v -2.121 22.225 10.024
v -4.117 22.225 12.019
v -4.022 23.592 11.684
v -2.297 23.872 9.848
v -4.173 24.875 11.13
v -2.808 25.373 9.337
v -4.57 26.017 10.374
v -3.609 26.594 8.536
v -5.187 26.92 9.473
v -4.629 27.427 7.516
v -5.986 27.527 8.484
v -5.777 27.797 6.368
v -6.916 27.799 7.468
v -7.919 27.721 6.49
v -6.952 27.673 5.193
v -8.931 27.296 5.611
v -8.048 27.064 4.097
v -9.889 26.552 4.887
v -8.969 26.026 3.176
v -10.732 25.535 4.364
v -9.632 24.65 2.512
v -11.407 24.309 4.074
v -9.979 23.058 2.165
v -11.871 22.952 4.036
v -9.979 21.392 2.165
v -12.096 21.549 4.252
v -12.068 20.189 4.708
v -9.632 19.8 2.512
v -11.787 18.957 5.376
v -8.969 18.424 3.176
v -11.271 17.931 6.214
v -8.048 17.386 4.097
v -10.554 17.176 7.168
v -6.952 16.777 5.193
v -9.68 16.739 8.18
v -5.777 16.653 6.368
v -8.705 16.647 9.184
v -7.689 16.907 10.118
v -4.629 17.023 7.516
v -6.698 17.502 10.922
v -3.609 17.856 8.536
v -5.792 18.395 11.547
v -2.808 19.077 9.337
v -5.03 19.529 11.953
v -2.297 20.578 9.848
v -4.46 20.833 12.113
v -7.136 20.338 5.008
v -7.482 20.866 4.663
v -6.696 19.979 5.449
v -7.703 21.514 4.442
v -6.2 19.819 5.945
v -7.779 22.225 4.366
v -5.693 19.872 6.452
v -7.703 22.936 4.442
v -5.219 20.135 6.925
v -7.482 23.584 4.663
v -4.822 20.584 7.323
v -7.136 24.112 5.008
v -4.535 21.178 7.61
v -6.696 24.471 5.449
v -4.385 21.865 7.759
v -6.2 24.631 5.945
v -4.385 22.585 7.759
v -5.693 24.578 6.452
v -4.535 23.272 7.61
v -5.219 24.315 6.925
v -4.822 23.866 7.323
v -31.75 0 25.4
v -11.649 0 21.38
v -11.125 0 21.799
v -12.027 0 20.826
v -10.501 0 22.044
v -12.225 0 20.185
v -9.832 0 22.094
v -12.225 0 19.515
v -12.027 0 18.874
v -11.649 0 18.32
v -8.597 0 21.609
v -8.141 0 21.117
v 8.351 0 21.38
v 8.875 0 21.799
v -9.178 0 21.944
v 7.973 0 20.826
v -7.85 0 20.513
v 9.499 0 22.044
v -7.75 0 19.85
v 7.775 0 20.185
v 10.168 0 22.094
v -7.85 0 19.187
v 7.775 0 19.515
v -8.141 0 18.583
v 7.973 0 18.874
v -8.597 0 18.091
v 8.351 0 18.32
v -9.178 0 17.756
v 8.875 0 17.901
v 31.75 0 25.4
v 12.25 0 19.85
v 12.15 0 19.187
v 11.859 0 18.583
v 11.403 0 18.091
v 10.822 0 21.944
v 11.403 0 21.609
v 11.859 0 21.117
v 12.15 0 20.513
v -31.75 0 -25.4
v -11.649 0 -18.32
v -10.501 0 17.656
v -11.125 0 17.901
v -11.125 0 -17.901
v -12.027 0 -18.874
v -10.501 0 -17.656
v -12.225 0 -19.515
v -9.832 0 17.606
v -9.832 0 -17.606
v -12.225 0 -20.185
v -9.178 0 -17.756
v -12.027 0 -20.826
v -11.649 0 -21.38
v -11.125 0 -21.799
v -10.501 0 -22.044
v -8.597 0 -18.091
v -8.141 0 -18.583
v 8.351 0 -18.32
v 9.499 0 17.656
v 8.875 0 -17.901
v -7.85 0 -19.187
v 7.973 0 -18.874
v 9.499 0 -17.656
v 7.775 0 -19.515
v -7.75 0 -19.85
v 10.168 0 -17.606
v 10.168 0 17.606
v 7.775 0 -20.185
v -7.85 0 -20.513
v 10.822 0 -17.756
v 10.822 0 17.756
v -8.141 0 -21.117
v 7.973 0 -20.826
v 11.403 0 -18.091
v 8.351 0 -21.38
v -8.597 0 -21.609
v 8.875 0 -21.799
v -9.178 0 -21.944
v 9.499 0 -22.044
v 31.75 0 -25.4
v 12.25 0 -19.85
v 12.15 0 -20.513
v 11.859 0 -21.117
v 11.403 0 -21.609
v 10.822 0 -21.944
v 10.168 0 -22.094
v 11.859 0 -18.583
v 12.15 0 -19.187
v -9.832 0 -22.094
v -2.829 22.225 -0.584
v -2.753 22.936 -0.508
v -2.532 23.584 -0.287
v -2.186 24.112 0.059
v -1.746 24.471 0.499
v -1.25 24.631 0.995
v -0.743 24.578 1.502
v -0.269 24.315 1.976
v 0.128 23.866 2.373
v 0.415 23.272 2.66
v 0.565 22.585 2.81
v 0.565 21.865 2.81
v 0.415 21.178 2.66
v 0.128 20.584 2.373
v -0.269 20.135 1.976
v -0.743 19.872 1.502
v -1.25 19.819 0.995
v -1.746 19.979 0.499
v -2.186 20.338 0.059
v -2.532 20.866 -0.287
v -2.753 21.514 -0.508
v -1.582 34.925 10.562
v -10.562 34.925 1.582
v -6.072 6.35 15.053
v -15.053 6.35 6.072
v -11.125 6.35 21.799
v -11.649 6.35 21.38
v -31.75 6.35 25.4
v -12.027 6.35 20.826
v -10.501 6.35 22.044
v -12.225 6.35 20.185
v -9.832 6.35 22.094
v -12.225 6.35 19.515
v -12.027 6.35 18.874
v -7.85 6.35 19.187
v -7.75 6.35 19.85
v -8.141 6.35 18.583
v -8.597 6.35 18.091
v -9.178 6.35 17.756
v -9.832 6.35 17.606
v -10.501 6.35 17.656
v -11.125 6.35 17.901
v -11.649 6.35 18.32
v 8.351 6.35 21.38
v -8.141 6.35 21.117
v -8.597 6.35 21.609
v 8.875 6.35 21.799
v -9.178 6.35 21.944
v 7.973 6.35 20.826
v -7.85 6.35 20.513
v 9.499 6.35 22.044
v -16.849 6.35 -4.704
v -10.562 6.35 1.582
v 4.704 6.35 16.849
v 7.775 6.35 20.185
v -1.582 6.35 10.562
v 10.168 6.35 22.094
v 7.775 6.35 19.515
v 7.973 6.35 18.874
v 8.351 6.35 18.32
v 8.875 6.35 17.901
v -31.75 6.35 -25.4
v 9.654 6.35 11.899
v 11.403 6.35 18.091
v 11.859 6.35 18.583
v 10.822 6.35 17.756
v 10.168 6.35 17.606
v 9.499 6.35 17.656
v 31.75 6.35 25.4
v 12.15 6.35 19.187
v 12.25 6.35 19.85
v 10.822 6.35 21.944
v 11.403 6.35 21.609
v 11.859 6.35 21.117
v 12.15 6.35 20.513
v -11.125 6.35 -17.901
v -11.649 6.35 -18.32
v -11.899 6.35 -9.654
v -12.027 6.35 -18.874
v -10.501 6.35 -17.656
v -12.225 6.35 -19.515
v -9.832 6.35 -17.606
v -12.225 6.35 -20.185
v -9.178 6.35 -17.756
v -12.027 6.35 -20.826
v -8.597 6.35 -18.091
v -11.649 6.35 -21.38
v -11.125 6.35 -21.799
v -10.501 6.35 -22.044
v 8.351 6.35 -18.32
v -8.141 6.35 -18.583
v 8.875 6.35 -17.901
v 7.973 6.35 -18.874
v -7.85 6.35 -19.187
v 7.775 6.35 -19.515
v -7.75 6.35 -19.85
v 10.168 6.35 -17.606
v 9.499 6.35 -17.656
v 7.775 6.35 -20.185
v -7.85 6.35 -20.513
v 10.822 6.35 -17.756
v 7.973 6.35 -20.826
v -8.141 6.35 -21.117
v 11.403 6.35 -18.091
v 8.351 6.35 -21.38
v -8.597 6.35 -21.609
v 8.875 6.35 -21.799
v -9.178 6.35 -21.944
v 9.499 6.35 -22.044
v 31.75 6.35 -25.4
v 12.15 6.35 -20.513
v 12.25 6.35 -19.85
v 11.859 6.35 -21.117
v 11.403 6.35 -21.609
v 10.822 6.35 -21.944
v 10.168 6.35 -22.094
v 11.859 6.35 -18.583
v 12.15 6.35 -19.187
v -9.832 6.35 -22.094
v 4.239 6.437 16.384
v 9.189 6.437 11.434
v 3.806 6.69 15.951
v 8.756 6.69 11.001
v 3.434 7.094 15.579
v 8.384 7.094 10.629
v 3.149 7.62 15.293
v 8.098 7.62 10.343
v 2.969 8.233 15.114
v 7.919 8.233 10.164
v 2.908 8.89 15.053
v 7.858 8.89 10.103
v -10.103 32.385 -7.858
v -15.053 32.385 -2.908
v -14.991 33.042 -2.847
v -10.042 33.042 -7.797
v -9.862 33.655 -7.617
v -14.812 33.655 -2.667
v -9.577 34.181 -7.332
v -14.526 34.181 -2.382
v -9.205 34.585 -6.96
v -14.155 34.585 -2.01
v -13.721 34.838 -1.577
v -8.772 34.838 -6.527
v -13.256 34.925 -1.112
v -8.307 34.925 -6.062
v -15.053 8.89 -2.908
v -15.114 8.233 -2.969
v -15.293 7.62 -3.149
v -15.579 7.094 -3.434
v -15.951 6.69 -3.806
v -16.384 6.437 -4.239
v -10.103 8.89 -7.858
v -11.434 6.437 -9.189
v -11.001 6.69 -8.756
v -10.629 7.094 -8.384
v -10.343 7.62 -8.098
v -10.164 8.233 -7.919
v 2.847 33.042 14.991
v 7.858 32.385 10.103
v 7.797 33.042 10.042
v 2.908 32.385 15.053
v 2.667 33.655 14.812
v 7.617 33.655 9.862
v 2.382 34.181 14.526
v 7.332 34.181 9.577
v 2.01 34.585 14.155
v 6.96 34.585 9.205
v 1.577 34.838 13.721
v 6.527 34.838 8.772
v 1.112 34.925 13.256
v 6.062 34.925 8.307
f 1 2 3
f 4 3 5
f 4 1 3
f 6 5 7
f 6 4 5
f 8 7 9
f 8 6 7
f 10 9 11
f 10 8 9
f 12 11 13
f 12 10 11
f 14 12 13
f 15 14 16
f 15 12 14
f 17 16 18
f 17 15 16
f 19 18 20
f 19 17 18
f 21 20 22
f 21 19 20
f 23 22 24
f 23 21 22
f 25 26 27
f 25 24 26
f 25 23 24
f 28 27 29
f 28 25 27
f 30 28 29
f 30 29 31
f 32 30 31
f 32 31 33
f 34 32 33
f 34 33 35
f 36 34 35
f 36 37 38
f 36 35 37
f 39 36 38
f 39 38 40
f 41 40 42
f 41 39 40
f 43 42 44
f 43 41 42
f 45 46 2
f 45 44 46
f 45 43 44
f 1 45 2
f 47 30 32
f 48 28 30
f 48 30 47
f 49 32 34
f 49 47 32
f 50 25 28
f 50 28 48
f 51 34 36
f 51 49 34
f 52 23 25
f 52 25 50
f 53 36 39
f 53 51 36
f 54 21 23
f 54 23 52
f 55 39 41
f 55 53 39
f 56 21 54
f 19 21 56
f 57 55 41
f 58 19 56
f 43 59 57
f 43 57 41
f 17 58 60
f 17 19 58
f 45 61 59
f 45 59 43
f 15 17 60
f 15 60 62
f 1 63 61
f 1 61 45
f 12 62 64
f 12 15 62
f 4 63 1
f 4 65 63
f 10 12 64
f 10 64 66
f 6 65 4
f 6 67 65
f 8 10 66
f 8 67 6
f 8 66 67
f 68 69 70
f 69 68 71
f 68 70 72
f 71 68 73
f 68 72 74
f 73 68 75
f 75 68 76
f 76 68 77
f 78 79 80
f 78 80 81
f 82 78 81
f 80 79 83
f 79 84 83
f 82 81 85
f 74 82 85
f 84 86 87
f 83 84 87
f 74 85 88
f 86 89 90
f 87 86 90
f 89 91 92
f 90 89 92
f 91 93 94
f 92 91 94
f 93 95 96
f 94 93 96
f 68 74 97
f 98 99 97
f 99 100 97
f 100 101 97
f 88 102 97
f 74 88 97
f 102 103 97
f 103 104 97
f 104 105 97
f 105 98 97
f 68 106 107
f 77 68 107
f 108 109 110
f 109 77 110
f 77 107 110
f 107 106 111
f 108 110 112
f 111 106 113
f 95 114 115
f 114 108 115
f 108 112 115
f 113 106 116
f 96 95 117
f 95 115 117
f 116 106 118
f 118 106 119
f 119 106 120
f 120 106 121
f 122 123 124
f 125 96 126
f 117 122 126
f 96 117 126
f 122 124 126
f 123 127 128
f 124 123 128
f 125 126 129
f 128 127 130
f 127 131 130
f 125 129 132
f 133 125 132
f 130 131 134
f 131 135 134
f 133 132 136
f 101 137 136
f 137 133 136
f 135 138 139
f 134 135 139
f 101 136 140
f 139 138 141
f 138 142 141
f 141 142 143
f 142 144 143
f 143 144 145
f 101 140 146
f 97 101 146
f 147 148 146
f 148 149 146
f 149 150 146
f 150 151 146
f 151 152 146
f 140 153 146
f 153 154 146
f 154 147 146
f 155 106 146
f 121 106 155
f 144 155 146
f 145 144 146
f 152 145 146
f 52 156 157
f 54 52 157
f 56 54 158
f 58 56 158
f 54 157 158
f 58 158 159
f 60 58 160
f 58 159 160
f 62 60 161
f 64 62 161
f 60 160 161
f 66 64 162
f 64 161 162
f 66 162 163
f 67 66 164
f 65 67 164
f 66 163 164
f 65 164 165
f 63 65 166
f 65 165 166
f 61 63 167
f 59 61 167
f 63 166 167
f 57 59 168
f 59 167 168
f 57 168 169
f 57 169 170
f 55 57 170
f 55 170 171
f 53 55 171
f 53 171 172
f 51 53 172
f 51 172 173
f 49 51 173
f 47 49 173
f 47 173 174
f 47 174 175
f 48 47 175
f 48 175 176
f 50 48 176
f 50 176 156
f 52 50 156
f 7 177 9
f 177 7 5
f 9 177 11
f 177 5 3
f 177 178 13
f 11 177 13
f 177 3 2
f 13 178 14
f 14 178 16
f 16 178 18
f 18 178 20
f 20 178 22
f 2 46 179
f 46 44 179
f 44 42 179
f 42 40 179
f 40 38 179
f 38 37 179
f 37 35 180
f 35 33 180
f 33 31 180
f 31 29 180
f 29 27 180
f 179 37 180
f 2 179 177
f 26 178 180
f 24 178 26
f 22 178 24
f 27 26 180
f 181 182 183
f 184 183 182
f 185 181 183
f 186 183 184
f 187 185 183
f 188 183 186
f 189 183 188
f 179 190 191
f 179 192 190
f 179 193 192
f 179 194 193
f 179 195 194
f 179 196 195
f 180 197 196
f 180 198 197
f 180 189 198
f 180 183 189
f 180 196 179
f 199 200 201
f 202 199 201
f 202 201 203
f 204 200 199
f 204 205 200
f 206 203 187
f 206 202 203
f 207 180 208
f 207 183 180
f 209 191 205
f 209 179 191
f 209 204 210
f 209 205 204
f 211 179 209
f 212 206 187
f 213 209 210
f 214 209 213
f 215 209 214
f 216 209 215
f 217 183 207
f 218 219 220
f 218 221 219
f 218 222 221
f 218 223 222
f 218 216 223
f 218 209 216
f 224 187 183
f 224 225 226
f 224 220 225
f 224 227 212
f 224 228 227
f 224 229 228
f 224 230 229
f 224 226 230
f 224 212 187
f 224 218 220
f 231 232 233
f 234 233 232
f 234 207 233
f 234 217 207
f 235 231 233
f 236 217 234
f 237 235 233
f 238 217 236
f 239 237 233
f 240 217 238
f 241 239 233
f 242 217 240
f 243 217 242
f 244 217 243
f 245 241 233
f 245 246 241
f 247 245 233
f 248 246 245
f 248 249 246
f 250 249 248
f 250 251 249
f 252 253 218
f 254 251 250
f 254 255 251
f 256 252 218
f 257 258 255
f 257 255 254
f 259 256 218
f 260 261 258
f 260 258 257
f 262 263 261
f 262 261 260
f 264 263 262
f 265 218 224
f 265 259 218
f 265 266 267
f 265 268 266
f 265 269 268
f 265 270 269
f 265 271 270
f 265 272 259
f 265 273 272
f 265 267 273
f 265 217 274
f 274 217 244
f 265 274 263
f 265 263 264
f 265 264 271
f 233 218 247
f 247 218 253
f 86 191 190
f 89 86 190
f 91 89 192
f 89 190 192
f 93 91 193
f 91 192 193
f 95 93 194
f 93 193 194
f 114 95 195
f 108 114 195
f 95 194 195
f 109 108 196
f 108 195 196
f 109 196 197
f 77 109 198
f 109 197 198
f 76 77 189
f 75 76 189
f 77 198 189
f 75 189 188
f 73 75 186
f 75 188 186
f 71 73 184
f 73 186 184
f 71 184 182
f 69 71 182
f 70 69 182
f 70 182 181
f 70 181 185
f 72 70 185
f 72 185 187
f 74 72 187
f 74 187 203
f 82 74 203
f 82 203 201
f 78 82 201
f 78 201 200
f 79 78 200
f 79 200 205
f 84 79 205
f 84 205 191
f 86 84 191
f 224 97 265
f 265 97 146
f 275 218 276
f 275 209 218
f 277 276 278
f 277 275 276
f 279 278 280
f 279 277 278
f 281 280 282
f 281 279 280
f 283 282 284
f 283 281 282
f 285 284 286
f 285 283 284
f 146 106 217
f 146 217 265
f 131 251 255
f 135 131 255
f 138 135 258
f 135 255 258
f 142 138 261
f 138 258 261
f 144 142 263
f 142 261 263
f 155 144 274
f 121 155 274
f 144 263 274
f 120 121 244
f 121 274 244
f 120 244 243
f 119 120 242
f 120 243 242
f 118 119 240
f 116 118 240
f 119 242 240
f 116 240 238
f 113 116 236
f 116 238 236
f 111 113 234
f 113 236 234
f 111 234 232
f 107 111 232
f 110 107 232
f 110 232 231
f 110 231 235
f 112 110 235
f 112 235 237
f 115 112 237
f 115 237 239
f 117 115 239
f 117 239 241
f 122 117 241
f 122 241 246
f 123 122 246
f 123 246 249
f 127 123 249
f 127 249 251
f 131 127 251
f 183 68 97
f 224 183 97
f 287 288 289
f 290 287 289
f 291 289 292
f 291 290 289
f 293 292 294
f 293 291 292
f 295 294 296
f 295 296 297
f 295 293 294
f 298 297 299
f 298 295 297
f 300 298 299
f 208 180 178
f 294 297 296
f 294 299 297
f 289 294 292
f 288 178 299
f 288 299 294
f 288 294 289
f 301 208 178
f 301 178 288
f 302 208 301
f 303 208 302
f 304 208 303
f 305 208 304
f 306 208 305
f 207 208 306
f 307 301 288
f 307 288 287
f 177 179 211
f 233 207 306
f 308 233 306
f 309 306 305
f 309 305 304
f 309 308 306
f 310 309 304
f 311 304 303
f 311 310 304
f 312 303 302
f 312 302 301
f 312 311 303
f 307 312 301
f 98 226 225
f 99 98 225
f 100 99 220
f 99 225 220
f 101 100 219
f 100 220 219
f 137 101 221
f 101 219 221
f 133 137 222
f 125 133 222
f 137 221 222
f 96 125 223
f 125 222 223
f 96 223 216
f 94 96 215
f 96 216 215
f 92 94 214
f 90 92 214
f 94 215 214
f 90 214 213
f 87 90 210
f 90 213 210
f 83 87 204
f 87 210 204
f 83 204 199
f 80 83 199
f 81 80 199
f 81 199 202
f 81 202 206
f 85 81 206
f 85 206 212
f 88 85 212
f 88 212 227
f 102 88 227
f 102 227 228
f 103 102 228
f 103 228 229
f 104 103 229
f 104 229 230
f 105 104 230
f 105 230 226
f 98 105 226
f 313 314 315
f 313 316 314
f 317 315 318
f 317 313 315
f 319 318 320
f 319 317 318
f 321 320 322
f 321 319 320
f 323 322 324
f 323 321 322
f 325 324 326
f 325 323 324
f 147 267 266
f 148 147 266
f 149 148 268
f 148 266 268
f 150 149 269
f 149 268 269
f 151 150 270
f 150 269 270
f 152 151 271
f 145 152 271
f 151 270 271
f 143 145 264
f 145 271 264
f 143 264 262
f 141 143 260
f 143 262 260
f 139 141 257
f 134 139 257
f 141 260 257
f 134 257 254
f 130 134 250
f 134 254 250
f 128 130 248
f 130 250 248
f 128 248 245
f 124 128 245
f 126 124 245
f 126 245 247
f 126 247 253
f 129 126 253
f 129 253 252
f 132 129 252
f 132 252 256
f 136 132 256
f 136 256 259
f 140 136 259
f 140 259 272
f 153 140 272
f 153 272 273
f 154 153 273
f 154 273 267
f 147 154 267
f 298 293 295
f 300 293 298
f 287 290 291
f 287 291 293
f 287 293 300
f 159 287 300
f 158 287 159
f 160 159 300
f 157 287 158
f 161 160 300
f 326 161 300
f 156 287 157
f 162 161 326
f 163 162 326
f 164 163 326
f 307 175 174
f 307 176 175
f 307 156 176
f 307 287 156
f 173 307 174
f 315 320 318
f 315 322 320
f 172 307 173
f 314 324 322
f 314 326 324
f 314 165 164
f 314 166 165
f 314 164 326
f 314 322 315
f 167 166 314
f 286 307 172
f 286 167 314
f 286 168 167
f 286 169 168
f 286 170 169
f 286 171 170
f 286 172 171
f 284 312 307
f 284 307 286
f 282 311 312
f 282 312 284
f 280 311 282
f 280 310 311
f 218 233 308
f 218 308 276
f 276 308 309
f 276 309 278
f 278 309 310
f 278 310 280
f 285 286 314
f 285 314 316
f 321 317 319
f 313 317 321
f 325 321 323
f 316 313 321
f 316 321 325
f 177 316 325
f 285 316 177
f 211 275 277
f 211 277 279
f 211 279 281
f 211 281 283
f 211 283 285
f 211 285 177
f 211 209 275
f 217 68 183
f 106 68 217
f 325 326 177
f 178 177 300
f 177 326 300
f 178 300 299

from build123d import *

# Parameters (mm, degrees)
SKETCH1_W           = 63.5
SKETCH1_H           = 50.8
BOSS_EXTRUDE1_DEPTH = 6.35
BOSS_EXTRUDE2_DEPTH = 28.575
SKETCH4_R           = 2.25
CUT_EXTRUDE2_DEPTH  = 7.35
FILLET1_R           = 2.54
SKETCH5_R           = 2.413
CUT_EXTRUDE3_DEPTH  = 39.823652545
BOSS_EXTRUDE3_DEPTH = 6.35
SKETCH7_R           = 5.588
CUT_EXTRUDE4_DEPTH  = 32.823641145


with BuildPart() as part:
    # Sketch1 → Boss-Extrude1 (new body)
    with BuildSketch(Plane(origin=(0, 0, 0), x_dir=(1, 0, 0), z_dir=(0, 1, 0))):
        Rectangle(SKETCH1_W, SKETCH1_H)
    extrude(amount=BOSS_EXTRUDE1_DEPTH)

    # Sketch2 → Boss-Extrude2 (add)
    with BuildSketch(Plane(origin=(0, 6.35, 0), x_dir=(1, 0, 0), z_dir=(0, 1, 0))):
        Polygon((2.907968577, -15.052543666), (-15.052543666, 2.907968577), (-10.102788136, 7.857724106), (7.857724106, -10.102788136), align=None)
    extrude(amount=BOSS_EXTRUDE2_DEPTH)

    # Sketch4 → Cut-Extrude2 (cut, through all)
    with BuildSketch(Plane(origin=(0, 6.35, 0), x_dir=(1, 0, 0), z_dir=(0, 1, 0))):
        with Locations((10, -19.85)):
            Circle(SKETCH4_R)
        with Locations((10, 19.85)):
            Circle(SKETCH4_R)
        with Locations((-10, 19.85)):
            Circle(SKETCH4_R)
        with Locations((-10, -19.85)):
            Circle(SKETCH4_R)
    extrude(amount=-CUT_EXTRUDE2_DEPTH, mode=Mode.SUBTRACT)

    # Fillet1
    fillet1_edges = [part.edges().sort_by_distance(p)[0] for p in [
        (5.382846341, 6.35, 12.577665901),
        (-12.577665901, 6.35, -5.382846341),
        (5.382846341, 34.925, 12.577665901),
        (-12.577665901, 34.925, -5.382846341),
    ]]
    fillet(fillet1_edges, radius=FILLET1_R)

    # Sketch5 → Cut-Extrude3 (cut, through all)
    with BuildSketch(Plane(origin=(-1.122532015, 0, 1.122532015), x_dir=(-0.707106781, 0, -0.707106781), z_dir=(0.707106781, 0, -0.707106781))):
        with Locations((0, 22.225)):
            Circle(SKETCH5_R)
    extrude(amount=-CUT_EXTRUDE3_DEPTH, mode=Mode.SUBTRACT)

    # Sketch6 → Boss-Extrude3 (add, symmetric)
    with BuildSketch(Plane(origin=(0, 0, 0), x_dir=(-0.707106781, 0, 0.707106781), z_dir=(-0.707106781, 0, -0.707106781))):
        Polygon((8.5875114, 34.925), (14.9375114, 6.35), (8.5875114, 6.35), align=None)
    extrude(amount=BOSS_EXTRUDE3_DEPTH, both=True)

    # Sketch7 → Cut-Extrude4 (cut, through all)
    with BuildSketch(Plane(origin=(-6.072287544, 0, 6.072287544), x_dir=(0.707106781, 0, 0.707106781), z_dir=(-0.707106781, 0, 0.707106781))):
        with Locations((0, 22.225)):
            Circle(SKETCH7_R)
    extrude(amount=CUT_EXTRUDE4_DEPTH, mode=Mode.SUBTRACT)


solid = part.part
